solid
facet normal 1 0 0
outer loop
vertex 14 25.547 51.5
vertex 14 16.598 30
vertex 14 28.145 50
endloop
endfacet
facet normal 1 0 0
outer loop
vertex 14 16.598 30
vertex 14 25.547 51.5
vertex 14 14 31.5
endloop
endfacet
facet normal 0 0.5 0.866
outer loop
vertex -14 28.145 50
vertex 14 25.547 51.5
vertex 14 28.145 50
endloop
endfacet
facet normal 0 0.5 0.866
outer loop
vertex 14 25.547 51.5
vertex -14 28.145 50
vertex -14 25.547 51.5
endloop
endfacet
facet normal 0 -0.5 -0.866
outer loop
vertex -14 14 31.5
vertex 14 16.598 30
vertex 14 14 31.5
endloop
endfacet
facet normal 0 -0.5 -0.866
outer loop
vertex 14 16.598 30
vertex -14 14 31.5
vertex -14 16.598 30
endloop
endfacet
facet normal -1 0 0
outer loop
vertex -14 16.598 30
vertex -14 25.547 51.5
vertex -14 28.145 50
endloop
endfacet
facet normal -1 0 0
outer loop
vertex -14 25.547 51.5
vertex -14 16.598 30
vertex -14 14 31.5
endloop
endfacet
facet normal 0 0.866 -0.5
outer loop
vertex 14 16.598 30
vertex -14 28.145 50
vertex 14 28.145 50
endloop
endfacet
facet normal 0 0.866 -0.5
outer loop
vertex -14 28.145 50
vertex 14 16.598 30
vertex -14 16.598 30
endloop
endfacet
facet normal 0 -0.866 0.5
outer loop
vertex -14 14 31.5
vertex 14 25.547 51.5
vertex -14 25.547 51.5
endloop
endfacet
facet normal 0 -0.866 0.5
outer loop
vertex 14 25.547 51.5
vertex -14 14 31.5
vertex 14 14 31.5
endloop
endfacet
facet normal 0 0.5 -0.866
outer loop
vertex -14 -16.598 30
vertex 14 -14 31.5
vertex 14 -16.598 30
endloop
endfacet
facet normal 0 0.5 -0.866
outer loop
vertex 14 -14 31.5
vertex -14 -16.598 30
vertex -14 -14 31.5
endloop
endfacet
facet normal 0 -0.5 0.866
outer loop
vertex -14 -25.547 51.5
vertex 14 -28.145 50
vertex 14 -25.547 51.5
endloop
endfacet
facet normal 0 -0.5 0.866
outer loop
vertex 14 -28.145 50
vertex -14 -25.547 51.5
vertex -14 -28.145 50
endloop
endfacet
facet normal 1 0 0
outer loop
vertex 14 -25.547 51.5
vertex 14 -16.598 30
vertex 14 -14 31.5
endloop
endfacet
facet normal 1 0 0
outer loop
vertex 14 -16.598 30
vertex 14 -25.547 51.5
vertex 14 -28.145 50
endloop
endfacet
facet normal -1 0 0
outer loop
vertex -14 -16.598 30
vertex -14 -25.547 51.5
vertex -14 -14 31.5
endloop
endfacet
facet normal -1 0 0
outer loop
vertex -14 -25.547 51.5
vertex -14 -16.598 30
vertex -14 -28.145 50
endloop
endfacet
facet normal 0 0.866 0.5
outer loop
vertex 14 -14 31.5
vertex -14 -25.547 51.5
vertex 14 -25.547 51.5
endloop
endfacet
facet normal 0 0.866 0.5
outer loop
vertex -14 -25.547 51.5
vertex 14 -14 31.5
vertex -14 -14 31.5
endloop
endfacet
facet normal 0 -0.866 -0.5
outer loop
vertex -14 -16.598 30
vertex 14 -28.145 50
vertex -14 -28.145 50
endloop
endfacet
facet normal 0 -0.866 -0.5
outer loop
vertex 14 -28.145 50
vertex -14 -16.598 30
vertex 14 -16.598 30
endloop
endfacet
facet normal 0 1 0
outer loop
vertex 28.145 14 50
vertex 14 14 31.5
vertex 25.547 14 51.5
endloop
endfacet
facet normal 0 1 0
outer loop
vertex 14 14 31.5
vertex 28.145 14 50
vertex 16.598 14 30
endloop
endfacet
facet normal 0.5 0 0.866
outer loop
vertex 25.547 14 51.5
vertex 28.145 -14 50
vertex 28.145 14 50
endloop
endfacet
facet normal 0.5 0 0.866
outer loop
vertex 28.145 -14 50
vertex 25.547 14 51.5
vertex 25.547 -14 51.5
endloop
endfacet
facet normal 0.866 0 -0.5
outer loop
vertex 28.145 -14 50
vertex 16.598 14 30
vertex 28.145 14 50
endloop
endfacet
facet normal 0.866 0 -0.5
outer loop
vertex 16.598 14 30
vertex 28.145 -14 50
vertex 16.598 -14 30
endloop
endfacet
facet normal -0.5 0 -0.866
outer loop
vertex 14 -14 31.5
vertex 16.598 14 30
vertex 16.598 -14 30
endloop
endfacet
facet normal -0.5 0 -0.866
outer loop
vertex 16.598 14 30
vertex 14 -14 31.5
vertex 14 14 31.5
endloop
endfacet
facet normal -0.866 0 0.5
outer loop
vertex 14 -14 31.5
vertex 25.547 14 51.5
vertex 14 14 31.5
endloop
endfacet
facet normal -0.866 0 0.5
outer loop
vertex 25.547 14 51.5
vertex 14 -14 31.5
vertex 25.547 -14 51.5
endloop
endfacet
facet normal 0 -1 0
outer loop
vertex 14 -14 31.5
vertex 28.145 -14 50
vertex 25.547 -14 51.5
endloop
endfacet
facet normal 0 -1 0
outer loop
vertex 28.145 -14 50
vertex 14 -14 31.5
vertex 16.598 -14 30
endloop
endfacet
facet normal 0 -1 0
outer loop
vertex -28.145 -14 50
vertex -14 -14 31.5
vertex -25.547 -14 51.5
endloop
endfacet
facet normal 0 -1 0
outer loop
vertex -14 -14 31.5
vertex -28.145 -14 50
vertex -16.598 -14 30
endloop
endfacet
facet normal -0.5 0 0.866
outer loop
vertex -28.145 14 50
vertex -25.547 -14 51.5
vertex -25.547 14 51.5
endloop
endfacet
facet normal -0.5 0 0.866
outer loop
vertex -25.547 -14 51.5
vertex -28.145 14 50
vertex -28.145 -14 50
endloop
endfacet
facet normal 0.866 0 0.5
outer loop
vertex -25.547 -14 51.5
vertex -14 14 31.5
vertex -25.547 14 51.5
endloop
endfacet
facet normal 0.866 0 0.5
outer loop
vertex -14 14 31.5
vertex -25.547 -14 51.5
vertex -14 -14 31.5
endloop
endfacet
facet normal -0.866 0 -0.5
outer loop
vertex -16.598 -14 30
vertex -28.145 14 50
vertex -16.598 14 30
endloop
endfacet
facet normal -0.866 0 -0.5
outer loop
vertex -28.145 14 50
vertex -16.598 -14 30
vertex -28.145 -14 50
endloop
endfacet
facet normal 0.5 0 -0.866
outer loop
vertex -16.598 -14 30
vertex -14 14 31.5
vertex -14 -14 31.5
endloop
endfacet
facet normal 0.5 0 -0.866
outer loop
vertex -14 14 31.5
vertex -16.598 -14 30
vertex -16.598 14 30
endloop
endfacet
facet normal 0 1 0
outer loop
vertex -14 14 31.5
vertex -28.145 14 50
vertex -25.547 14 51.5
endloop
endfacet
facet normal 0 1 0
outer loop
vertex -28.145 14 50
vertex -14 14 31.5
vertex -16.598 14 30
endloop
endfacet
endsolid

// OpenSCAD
boxHeight = 30;
boxDimension = 28;
boxWidth = boxDimension;
boxDepth = boxDimension;
boxThickness = 3;
guideHeight = 20;
guideAngle = 30;

guideLength = guideHeight/cos(guideAngle);
guideWidth = guideHeight*tan(guideAngle);

translate([0,(boxDepth+guideWidth+boxThickness*cos(guideAngle))/2,boxHeight+(guideHeight+boxThickness*sin(guideAngle))/2])
rotate(-guideAngle,[1,0,0])
cube([boxWidth,boxThickness,guideLength],center = true);

translate([0,-(boxDepth+guideWidth+boxThickness*cos(guideAngle))/2,boxHeight+(guideHeight+boxThickness*sin(guideAngle))/2])
rotate(guideAngle,[1,0,0])
cube([boxWidth,boxThickness,guideLength],center = true);

translate([(boxWidth+guideWidth+boxThickness*cos(guideAngle))/2,0,boxHeight+(guideHeight+boxThickness*sin(guideAngle))/2])
rotate(guideAngle,[0,1,0])
cube([boxThickness,boxDepth,guideLength],center = true);

translate([-(boxWidth+guideWidth+boxThickness*cos(guideAngle))/2,0,boxHeight+(guideHeight+boxThickness*sin(guideAngle))/2])
rotate(-guideAngle,[0,1,0])
cube([boxThickness,boxDepth,guideLength],center = true);
